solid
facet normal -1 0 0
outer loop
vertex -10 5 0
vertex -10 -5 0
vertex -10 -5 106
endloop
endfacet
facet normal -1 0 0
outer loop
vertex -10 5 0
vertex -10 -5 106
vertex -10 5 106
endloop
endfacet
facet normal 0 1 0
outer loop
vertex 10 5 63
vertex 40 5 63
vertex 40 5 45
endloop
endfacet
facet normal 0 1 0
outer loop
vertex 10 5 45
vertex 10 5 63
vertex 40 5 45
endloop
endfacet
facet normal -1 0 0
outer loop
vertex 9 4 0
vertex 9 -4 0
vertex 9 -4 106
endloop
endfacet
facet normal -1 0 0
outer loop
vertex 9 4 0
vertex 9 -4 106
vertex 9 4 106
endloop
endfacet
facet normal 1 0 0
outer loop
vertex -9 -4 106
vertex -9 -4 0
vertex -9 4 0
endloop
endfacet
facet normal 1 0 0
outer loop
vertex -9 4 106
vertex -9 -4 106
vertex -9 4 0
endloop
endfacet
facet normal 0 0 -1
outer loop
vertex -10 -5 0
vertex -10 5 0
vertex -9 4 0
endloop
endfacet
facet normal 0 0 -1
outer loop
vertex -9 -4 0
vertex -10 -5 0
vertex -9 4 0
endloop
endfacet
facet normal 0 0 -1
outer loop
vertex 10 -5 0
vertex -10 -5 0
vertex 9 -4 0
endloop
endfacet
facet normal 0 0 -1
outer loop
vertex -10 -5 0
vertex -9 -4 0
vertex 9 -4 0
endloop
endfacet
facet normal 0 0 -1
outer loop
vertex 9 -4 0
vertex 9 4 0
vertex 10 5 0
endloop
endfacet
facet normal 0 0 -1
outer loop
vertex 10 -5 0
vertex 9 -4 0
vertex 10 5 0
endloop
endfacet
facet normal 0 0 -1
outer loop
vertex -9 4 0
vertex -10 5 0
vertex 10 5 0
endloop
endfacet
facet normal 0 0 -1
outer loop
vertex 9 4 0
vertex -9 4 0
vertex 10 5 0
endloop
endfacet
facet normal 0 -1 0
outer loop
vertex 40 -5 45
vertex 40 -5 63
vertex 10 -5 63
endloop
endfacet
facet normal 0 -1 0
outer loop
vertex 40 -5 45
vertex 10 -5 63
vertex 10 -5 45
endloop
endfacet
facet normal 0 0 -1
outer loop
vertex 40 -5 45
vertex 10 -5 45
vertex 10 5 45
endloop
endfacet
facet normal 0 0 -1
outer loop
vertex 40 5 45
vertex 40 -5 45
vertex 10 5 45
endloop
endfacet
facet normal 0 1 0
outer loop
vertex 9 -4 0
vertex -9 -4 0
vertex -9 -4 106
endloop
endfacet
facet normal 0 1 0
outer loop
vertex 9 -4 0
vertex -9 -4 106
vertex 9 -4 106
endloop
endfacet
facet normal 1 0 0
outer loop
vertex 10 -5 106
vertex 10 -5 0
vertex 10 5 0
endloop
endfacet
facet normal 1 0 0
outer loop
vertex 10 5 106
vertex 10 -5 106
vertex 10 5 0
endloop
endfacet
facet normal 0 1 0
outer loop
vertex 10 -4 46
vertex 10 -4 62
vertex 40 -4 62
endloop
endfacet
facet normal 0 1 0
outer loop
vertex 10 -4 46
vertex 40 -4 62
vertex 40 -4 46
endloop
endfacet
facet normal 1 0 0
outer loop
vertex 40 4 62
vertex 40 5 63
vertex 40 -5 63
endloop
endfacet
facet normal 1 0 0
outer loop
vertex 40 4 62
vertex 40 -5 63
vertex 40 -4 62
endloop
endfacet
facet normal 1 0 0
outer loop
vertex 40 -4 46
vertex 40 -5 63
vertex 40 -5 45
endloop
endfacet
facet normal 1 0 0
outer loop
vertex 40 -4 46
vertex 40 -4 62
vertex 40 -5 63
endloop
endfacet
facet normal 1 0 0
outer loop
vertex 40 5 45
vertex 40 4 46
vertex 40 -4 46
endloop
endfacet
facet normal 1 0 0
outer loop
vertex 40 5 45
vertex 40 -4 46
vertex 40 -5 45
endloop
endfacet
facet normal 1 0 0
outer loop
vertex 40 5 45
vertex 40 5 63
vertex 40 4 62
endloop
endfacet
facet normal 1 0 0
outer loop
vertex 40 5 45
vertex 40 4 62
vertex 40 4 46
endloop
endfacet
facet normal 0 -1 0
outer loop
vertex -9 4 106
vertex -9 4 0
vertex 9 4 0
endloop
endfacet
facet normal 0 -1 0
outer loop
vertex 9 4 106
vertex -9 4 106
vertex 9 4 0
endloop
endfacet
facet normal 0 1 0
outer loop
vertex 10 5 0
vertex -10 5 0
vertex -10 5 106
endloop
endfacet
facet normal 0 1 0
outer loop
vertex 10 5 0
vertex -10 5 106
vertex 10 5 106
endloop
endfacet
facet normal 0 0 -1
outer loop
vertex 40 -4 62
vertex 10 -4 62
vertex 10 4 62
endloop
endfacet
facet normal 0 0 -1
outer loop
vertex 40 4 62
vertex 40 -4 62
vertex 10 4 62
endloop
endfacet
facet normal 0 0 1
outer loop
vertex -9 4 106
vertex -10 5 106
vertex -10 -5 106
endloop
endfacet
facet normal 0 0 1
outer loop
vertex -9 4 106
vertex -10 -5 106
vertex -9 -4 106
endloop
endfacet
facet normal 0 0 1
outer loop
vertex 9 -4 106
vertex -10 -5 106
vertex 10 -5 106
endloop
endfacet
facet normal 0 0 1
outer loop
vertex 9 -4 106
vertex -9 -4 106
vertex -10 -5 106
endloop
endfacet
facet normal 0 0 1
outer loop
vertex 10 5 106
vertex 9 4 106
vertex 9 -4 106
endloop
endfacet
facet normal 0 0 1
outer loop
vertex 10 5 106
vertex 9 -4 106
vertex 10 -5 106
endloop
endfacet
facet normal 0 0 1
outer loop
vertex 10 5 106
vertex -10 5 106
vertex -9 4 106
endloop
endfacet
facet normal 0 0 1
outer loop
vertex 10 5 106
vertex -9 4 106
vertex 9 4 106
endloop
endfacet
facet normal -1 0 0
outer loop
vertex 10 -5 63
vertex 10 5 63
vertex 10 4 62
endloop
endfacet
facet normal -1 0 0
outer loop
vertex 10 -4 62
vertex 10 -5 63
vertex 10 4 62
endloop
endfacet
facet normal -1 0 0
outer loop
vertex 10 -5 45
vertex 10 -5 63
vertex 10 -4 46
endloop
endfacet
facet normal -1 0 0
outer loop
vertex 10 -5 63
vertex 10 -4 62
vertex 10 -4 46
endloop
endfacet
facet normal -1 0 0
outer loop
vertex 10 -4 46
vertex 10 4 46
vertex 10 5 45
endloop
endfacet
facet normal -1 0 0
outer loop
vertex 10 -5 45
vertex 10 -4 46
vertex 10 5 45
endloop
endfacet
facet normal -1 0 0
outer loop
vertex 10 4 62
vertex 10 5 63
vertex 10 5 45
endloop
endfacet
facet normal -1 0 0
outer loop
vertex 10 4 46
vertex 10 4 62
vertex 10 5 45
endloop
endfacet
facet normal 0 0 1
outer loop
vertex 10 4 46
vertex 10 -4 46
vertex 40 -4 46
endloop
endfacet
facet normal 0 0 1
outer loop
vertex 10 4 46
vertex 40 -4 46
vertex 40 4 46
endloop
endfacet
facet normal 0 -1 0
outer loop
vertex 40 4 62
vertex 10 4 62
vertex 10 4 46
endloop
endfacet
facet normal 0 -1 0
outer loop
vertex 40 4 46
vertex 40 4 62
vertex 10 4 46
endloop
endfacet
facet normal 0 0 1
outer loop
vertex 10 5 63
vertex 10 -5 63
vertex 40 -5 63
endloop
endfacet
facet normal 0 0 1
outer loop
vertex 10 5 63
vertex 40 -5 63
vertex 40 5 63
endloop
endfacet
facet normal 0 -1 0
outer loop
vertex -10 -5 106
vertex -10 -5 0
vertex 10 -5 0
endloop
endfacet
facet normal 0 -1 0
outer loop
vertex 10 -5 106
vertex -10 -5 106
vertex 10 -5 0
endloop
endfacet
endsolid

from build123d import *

# Parameters (mm, degrees)
SKETCH_1_W      = 20
SKETCH_1_H      = 10
SKETCH_1_W_2    = 18
SKETCH_1_H_2    = 8
EXTRUDE_1_DEPTH = 106
SKETCH_2_W      = 18
SKETCH_2_H      = 10
SKETCH_2_W_2    = 16
SKETCH_2_H_2    = 8
EXTRUDE_2_DEPTH = 30


with BuildPart() as part:
    # 草图1 → 凸台-拉伸1 (new body)
    with BuildSketch(Plane.XY):
        Rectangle(SKETCH_1_W, SKETCH_1_H)
        Rectangle(SKETCH_1_W_2, SKETCH_1_H_2, mode=Mode.SUBTRACT)
    extrude(amount=EXTRUDE_1_DEPTH)


with BuildPart() as body_2:
    # 草图2 → 凸台-拉伸2 (new body)
    with BuildSketch(Plane(origin=(10, 0, 0), x_dir=(0, 0, -1), z_dir=(1, 0, 0))):
        with Locations((-54, 0)):
            Rectangle(SKETCH_2_W, SKETCH_2_H)
        with Locations((-54, 0)):
            Rectangle(SKETCH_2_W_2, SKETCH_2_H_2, mode=Mode.SUBTRACT)
    extrude(amount=EXTRUDE_2_DEPTH)


solid = Compound([part.part, body_2.part])
